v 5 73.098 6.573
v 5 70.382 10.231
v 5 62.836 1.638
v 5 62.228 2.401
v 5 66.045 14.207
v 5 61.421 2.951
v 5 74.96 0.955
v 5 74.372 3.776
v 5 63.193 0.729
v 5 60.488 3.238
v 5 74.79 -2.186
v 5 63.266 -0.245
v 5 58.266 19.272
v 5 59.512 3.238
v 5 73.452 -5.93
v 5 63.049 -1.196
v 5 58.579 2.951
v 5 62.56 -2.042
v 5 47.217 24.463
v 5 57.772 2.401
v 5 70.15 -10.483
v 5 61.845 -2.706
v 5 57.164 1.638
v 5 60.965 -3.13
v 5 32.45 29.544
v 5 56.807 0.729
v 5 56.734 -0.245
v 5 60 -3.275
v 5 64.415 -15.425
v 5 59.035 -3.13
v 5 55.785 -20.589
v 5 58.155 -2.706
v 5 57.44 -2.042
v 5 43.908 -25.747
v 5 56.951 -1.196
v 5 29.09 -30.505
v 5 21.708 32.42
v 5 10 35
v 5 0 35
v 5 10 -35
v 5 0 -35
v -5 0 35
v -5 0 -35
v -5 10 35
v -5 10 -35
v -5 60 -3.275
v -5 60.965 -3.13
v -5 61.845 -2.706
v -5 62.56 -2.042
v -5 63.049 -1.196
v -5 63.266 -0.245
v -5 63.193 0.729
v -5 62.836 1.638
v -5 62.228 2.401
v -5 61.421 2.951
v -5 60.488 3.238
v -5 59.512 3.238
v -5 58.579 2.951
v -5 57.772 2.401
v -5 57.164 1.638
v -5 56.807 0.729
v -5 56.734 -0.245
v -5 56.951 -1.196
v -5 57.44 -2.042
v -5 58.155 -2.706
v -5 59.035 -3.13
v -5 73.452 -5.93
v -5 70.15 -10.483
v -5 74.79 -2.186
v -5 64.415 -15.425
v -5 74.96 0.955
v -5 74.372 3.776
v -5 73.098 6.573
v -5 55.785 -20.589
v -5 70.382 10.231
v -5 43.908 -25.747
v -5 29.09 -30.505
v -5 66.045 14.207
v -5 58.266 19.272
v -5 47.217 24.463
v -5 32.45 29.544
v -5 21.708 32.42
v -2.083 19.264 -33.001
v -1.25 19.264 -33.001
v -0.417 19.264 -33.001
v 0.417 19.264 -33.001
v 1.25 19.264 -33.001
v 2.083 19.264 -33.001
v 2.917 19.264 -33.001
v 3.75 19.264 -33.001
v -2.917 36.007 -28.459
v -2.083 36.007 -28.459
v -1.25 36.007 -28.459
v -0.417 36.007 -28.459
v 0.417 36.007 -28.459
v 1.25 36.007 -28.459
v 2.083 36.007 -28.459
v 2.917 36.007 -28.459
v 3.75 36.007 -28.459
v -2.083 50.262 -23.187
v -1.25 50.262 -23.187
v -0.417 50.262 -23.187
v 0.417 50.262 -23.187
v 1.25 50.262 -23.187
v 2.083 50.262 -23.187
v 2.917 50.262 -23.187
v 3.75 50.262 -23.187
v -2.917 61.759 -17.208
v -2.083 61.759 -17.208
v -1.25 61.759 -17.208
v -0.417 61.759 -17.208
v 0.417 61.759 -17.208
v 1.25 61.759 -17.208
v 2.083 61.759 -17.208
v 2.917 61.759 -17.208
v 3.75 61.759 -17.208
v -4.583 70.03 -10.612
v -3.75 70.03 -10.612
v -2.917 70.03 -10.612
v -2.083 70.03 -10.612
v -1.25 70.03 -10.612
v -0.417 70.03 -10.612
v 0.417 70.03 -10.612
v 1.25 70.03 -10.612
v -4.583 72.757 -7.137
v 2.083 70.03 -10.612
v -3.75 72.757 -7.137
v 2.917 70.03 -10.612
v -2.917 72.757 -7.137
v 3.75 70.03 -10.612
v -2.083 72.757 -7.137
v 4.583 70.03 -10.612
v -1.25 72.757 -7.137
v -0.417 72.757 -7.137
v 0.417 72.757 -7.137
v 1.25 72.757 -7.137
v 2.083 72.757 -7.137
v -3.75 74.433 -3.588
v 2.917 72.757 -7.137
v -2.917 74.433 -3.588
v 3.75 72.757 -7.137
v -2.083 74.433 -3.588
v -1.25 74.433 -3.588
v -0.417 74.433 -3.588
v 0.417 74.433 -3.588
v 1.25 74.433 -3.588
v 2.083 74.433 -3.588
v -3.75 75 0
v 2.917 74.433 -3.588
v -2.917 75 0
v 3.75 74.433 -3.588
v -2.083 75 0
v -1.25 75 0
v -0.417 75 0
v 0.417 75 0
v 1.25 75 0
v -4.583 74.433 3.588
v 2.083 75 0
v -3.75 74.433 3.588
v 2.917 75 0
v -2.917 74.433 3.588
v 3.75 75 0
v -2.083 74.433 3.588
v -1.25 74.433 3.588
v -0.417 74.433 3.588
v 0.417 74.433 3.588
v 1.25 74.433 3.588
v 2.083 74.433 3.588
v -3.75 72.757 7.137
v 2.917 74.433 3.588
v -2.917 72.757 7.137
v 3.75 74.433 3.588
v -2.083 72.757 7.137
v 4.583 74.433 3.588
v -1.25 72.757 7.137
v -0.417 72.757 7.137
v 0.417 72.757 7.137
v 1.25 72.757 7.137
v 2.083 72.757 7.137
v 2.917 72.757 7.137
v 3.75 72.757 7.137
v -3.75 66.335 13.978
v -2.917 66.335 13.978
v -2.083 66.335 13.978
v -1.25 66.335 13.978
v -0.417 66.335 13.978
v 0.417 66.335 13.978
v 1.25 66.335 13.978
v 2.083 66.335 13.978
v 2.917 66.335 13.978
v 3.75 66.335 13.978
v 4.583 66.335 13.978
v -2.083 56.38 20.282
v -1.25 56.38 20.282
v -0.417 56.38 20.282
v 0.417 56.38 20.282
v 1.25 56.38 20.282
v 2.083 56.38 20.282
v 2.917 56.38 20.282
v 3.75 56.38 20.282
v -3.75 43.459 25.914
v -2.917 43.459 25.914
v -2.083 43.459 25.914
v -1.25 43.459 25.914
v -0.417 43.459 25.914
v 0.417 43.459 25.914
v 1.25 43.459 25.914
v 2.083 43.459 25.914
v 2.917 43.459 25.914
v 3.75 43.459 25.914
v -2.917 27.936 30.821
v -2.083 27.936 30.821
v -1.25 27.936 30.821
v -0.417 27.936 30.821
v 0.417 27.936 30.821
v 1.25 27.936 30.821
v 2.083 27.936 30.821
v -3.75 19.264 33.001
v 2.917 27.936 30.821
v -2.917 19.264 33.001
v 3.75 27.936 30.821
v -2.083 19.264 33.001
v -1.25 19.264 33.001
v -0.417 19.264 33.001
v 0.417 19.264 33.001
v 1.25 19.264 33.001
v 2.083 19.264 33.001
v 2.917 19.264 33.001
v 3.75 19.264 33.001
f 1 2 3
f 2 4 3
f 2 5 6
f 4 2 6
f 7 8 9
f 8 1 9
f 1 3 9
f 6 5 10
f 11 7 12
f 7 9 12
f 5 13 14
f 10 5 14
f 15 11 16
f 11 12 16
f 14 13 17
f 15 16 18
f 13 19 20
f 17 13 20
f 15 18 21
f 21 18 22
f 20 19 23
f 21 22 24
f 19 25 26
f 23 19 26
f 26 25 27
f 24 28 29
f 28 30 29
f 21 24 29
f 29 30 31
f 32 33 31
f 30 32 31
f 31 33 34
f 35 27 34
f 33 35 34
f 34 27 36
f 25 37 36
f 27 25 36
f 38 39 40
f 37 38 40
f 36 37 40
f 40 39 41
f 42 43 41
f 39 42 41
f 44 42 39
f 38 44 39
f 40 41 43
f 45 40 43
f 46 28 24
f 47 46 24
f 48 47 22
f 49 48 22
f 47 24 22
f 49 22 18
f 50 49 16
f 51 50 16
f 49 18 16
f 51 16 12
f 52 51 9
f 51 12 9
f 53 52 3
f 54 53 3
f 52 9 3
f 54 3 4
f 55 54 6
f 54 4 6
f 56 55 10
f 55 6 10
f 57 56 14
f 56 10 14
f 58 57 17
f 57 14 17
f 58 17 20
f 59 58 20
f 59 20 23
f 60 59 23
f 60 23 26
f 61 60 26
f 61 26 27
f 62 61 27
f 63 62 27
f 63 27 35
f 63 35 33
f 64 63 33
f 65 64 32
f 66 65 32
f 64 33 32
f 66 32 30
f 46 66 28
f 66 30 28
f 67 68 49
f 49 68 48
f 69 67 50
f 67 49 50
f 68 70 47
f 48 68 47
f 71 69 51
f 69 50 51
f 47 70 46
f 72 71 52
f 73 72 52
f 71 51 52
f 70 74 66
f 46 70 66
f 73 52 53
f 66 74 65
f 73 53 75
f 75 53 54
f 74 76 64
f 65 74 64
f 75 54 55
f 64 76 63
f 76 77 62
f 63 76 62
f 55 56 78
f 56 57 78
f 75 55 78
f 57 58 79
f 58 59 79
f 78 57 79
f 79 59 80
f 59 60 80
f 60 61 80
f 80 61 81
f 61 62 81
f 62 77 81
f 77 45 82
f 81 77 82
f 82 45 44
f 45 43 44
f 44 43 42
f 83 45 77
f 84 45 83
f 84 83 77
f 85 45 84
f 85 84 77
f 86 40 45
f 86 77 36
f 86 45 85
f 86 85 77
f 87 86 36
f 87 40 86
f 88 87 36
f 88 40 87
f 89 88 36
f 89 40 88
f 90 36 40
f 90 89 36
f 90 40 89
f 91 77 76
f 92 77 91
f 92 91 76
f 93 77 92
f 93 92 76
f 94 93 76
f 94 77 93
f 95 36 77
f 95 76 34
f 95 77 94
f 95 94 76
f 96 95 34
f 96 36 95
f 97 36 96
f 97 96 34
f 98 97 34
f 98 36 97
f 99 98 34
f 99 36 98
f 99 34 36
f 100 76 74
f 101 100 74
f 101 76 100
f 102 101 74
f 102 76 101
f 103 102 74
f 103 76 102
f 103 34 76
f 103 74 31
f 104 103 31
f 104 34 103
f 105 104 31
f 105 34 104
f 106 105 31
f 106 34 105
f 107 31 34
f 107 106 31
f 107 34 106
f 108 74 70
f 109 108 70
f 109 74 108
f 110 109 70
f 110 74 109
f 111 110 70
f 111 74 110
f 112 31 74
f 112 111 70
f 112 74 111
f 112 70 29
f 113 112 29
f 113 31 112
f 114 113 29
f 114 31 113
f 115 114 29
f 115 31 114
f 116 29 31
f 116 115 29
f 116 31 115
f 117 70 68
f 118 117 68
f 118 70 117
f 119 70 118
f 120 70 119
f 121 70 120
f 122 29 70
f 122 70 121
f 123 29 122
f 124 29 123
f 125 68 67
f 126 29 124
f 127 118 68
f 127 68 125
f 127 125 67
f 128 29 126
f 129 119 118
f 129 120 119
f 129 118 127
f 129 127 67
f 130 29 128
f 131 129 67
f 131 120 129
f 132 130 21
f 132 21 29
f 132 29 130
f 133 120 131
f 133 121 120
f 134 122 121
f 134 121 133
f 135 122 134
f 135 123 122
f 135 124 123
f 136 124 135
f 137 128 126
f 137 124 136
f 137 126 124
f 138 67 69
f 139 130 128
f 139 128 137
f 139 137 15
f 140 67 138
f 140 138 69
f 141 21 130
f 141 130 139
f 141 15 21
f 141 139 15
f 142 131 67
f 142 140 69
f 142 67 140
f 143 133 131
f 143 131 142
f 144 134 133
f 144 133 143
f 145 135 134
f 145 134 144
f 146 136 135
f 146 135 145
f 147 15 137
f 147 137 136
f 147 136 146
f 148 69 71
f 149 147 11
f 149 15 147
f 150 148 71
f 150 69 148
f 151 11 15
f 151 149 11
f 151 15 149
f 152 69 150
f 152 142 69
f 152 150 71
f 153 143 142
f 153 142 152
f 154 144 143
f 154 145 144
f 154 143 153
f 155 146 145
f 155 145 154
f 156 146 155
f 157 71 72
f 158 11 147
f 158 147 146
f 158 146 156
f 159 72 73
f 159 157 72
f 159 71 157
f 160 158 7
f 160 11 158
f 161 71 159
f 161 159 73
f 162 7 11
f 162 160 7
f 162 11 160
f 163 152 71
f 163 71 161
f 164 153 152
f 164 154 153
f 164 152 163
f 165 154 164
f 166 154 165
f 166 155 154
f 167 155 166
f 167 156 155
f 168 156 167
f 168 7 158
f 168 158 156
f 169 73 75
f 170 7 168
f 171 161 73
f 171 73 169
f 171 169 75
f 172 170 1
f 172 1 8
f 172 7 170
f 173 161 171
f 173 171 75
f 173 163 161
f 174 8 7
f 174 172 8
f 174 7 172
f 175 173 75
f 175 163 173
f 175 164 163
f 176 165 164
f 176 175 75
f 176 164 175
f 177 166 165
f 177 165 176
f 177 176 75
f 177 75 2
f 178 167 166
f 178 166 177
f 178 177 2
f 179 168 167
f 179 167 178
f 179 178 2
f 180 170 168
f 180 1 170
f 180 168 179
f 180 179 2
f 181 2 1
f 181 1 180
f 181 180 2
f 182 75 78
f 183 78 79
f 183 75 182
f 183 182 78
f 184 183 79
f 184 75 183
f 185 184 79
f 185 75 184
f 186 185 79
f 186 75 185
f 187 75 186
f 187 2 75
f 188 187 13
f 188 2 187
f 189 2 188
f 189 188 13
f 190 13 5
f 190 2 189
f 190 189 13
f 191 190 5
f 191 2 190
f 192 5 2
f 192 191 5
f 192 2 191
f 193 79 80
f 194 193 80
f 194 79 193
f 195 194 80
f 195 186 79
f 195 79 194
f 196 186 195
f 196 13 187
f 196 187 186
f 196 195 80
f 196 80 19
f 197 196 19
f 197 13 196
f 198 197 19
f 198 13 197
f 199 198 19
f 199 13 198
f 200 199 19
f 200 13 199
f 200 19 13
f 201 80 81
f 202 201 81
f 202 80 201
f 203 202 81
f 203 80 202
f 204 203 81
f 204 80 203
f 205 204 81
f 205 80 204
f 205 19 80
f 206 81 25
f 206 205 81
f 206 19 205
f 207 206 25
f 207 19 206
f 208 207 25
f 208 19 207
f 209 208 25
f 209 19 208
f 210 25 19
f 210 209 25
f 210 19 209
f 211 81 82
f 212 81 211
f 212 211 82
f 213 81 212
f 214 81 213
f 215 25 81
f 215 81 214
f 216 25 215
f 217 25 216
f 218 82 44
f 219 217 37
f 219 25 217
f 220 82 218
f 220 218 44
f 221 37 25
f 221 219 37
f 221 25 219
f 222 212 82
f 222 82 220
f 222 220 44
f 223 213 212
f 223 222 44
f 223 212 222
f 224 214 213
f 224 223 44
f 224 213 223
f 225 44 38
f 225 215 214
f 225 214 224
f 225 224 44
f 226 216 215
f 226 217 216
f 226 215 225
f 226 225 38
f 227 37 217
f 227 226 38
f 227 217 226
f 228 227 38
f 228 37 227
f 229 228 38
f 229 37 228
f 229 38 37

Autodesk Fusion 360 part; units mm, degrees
sketch "Sketch1" plane through (0, 0, 0) normal (0, 1, 0) x (1, 0, 0)
  line L0 (5, 35) -> (-5, 35)
  line L1 (-5, 35) -> (-5, -35)
  line L2 (-5, -35) -> (5, -35)
  line L3 (5, -35) -> (5, 35)
  line L4 (5, 35) -> (-5, -35) construction
  line L5 (-5, 35) -> (5, -35) construction
  dimension "d1" = 10
  dimension "d2" = 70
extrude "Extrude1" add sketch "Sketch1" along normal blind 10
sketch "Sketch2" plane through (5, 0, 0) normal (1, 0, 0) x (0, 0, -1)
  line L0 (-35, 0) -> (35, 0)
  line L1 (35, 0) -> (35, 10)
  line L2 (35, 10) -> (-35, 10)
  line L3 (-35, 10) -> (-35, 0)
  circle A0 centre (0, 60) radius 3.275
  spline S0 degree 5 poles (35, 10) (34.5419, 12.294) (33.5997, 16.7974) (32.1085, 23.2982) (29.9637, 31.4555) (27.0193, 40.7815) (23.8113, 49.198) (20.344, 56.6442) (16.6298, 63.0336) (12.6921, 68.253) (8.5705, 72.156) (4.3189, 74.5848) (0, 75.4133) (-4.3189, 74.5848) (-8.5705, 72.156) (-12.6921, 68.253) (-16.6298, 63.0336) (-20.344, 56.6442) (-23.8113, 49.198) (-27.0193, 40.7815) (-29.9637, 31.4555) (-32.1085, 23.2982) (-33.5997, 16.7974) (-34.5419, 12.294) (-35, 10) knots 0 0 0 0 0 0 0.05 0.1 0.15 0.2 0.25 0.3 0.35 0.4 0.45 0.5 0.55 0.6 0.65 0.7 0.75 0.8 0.85 0.9 0.95 1 1 1 1 1 1
  point P0 (15, 65)
  point P1 (0, 75)
  point P2 (-15, 65)
  dimension "d8" = 6.55
  dimension "d16" = 50
  dimension "d17" = 35
extrude "Extrude3" add sketch "Sketch2" against normal blind 10 contours L2 S0
